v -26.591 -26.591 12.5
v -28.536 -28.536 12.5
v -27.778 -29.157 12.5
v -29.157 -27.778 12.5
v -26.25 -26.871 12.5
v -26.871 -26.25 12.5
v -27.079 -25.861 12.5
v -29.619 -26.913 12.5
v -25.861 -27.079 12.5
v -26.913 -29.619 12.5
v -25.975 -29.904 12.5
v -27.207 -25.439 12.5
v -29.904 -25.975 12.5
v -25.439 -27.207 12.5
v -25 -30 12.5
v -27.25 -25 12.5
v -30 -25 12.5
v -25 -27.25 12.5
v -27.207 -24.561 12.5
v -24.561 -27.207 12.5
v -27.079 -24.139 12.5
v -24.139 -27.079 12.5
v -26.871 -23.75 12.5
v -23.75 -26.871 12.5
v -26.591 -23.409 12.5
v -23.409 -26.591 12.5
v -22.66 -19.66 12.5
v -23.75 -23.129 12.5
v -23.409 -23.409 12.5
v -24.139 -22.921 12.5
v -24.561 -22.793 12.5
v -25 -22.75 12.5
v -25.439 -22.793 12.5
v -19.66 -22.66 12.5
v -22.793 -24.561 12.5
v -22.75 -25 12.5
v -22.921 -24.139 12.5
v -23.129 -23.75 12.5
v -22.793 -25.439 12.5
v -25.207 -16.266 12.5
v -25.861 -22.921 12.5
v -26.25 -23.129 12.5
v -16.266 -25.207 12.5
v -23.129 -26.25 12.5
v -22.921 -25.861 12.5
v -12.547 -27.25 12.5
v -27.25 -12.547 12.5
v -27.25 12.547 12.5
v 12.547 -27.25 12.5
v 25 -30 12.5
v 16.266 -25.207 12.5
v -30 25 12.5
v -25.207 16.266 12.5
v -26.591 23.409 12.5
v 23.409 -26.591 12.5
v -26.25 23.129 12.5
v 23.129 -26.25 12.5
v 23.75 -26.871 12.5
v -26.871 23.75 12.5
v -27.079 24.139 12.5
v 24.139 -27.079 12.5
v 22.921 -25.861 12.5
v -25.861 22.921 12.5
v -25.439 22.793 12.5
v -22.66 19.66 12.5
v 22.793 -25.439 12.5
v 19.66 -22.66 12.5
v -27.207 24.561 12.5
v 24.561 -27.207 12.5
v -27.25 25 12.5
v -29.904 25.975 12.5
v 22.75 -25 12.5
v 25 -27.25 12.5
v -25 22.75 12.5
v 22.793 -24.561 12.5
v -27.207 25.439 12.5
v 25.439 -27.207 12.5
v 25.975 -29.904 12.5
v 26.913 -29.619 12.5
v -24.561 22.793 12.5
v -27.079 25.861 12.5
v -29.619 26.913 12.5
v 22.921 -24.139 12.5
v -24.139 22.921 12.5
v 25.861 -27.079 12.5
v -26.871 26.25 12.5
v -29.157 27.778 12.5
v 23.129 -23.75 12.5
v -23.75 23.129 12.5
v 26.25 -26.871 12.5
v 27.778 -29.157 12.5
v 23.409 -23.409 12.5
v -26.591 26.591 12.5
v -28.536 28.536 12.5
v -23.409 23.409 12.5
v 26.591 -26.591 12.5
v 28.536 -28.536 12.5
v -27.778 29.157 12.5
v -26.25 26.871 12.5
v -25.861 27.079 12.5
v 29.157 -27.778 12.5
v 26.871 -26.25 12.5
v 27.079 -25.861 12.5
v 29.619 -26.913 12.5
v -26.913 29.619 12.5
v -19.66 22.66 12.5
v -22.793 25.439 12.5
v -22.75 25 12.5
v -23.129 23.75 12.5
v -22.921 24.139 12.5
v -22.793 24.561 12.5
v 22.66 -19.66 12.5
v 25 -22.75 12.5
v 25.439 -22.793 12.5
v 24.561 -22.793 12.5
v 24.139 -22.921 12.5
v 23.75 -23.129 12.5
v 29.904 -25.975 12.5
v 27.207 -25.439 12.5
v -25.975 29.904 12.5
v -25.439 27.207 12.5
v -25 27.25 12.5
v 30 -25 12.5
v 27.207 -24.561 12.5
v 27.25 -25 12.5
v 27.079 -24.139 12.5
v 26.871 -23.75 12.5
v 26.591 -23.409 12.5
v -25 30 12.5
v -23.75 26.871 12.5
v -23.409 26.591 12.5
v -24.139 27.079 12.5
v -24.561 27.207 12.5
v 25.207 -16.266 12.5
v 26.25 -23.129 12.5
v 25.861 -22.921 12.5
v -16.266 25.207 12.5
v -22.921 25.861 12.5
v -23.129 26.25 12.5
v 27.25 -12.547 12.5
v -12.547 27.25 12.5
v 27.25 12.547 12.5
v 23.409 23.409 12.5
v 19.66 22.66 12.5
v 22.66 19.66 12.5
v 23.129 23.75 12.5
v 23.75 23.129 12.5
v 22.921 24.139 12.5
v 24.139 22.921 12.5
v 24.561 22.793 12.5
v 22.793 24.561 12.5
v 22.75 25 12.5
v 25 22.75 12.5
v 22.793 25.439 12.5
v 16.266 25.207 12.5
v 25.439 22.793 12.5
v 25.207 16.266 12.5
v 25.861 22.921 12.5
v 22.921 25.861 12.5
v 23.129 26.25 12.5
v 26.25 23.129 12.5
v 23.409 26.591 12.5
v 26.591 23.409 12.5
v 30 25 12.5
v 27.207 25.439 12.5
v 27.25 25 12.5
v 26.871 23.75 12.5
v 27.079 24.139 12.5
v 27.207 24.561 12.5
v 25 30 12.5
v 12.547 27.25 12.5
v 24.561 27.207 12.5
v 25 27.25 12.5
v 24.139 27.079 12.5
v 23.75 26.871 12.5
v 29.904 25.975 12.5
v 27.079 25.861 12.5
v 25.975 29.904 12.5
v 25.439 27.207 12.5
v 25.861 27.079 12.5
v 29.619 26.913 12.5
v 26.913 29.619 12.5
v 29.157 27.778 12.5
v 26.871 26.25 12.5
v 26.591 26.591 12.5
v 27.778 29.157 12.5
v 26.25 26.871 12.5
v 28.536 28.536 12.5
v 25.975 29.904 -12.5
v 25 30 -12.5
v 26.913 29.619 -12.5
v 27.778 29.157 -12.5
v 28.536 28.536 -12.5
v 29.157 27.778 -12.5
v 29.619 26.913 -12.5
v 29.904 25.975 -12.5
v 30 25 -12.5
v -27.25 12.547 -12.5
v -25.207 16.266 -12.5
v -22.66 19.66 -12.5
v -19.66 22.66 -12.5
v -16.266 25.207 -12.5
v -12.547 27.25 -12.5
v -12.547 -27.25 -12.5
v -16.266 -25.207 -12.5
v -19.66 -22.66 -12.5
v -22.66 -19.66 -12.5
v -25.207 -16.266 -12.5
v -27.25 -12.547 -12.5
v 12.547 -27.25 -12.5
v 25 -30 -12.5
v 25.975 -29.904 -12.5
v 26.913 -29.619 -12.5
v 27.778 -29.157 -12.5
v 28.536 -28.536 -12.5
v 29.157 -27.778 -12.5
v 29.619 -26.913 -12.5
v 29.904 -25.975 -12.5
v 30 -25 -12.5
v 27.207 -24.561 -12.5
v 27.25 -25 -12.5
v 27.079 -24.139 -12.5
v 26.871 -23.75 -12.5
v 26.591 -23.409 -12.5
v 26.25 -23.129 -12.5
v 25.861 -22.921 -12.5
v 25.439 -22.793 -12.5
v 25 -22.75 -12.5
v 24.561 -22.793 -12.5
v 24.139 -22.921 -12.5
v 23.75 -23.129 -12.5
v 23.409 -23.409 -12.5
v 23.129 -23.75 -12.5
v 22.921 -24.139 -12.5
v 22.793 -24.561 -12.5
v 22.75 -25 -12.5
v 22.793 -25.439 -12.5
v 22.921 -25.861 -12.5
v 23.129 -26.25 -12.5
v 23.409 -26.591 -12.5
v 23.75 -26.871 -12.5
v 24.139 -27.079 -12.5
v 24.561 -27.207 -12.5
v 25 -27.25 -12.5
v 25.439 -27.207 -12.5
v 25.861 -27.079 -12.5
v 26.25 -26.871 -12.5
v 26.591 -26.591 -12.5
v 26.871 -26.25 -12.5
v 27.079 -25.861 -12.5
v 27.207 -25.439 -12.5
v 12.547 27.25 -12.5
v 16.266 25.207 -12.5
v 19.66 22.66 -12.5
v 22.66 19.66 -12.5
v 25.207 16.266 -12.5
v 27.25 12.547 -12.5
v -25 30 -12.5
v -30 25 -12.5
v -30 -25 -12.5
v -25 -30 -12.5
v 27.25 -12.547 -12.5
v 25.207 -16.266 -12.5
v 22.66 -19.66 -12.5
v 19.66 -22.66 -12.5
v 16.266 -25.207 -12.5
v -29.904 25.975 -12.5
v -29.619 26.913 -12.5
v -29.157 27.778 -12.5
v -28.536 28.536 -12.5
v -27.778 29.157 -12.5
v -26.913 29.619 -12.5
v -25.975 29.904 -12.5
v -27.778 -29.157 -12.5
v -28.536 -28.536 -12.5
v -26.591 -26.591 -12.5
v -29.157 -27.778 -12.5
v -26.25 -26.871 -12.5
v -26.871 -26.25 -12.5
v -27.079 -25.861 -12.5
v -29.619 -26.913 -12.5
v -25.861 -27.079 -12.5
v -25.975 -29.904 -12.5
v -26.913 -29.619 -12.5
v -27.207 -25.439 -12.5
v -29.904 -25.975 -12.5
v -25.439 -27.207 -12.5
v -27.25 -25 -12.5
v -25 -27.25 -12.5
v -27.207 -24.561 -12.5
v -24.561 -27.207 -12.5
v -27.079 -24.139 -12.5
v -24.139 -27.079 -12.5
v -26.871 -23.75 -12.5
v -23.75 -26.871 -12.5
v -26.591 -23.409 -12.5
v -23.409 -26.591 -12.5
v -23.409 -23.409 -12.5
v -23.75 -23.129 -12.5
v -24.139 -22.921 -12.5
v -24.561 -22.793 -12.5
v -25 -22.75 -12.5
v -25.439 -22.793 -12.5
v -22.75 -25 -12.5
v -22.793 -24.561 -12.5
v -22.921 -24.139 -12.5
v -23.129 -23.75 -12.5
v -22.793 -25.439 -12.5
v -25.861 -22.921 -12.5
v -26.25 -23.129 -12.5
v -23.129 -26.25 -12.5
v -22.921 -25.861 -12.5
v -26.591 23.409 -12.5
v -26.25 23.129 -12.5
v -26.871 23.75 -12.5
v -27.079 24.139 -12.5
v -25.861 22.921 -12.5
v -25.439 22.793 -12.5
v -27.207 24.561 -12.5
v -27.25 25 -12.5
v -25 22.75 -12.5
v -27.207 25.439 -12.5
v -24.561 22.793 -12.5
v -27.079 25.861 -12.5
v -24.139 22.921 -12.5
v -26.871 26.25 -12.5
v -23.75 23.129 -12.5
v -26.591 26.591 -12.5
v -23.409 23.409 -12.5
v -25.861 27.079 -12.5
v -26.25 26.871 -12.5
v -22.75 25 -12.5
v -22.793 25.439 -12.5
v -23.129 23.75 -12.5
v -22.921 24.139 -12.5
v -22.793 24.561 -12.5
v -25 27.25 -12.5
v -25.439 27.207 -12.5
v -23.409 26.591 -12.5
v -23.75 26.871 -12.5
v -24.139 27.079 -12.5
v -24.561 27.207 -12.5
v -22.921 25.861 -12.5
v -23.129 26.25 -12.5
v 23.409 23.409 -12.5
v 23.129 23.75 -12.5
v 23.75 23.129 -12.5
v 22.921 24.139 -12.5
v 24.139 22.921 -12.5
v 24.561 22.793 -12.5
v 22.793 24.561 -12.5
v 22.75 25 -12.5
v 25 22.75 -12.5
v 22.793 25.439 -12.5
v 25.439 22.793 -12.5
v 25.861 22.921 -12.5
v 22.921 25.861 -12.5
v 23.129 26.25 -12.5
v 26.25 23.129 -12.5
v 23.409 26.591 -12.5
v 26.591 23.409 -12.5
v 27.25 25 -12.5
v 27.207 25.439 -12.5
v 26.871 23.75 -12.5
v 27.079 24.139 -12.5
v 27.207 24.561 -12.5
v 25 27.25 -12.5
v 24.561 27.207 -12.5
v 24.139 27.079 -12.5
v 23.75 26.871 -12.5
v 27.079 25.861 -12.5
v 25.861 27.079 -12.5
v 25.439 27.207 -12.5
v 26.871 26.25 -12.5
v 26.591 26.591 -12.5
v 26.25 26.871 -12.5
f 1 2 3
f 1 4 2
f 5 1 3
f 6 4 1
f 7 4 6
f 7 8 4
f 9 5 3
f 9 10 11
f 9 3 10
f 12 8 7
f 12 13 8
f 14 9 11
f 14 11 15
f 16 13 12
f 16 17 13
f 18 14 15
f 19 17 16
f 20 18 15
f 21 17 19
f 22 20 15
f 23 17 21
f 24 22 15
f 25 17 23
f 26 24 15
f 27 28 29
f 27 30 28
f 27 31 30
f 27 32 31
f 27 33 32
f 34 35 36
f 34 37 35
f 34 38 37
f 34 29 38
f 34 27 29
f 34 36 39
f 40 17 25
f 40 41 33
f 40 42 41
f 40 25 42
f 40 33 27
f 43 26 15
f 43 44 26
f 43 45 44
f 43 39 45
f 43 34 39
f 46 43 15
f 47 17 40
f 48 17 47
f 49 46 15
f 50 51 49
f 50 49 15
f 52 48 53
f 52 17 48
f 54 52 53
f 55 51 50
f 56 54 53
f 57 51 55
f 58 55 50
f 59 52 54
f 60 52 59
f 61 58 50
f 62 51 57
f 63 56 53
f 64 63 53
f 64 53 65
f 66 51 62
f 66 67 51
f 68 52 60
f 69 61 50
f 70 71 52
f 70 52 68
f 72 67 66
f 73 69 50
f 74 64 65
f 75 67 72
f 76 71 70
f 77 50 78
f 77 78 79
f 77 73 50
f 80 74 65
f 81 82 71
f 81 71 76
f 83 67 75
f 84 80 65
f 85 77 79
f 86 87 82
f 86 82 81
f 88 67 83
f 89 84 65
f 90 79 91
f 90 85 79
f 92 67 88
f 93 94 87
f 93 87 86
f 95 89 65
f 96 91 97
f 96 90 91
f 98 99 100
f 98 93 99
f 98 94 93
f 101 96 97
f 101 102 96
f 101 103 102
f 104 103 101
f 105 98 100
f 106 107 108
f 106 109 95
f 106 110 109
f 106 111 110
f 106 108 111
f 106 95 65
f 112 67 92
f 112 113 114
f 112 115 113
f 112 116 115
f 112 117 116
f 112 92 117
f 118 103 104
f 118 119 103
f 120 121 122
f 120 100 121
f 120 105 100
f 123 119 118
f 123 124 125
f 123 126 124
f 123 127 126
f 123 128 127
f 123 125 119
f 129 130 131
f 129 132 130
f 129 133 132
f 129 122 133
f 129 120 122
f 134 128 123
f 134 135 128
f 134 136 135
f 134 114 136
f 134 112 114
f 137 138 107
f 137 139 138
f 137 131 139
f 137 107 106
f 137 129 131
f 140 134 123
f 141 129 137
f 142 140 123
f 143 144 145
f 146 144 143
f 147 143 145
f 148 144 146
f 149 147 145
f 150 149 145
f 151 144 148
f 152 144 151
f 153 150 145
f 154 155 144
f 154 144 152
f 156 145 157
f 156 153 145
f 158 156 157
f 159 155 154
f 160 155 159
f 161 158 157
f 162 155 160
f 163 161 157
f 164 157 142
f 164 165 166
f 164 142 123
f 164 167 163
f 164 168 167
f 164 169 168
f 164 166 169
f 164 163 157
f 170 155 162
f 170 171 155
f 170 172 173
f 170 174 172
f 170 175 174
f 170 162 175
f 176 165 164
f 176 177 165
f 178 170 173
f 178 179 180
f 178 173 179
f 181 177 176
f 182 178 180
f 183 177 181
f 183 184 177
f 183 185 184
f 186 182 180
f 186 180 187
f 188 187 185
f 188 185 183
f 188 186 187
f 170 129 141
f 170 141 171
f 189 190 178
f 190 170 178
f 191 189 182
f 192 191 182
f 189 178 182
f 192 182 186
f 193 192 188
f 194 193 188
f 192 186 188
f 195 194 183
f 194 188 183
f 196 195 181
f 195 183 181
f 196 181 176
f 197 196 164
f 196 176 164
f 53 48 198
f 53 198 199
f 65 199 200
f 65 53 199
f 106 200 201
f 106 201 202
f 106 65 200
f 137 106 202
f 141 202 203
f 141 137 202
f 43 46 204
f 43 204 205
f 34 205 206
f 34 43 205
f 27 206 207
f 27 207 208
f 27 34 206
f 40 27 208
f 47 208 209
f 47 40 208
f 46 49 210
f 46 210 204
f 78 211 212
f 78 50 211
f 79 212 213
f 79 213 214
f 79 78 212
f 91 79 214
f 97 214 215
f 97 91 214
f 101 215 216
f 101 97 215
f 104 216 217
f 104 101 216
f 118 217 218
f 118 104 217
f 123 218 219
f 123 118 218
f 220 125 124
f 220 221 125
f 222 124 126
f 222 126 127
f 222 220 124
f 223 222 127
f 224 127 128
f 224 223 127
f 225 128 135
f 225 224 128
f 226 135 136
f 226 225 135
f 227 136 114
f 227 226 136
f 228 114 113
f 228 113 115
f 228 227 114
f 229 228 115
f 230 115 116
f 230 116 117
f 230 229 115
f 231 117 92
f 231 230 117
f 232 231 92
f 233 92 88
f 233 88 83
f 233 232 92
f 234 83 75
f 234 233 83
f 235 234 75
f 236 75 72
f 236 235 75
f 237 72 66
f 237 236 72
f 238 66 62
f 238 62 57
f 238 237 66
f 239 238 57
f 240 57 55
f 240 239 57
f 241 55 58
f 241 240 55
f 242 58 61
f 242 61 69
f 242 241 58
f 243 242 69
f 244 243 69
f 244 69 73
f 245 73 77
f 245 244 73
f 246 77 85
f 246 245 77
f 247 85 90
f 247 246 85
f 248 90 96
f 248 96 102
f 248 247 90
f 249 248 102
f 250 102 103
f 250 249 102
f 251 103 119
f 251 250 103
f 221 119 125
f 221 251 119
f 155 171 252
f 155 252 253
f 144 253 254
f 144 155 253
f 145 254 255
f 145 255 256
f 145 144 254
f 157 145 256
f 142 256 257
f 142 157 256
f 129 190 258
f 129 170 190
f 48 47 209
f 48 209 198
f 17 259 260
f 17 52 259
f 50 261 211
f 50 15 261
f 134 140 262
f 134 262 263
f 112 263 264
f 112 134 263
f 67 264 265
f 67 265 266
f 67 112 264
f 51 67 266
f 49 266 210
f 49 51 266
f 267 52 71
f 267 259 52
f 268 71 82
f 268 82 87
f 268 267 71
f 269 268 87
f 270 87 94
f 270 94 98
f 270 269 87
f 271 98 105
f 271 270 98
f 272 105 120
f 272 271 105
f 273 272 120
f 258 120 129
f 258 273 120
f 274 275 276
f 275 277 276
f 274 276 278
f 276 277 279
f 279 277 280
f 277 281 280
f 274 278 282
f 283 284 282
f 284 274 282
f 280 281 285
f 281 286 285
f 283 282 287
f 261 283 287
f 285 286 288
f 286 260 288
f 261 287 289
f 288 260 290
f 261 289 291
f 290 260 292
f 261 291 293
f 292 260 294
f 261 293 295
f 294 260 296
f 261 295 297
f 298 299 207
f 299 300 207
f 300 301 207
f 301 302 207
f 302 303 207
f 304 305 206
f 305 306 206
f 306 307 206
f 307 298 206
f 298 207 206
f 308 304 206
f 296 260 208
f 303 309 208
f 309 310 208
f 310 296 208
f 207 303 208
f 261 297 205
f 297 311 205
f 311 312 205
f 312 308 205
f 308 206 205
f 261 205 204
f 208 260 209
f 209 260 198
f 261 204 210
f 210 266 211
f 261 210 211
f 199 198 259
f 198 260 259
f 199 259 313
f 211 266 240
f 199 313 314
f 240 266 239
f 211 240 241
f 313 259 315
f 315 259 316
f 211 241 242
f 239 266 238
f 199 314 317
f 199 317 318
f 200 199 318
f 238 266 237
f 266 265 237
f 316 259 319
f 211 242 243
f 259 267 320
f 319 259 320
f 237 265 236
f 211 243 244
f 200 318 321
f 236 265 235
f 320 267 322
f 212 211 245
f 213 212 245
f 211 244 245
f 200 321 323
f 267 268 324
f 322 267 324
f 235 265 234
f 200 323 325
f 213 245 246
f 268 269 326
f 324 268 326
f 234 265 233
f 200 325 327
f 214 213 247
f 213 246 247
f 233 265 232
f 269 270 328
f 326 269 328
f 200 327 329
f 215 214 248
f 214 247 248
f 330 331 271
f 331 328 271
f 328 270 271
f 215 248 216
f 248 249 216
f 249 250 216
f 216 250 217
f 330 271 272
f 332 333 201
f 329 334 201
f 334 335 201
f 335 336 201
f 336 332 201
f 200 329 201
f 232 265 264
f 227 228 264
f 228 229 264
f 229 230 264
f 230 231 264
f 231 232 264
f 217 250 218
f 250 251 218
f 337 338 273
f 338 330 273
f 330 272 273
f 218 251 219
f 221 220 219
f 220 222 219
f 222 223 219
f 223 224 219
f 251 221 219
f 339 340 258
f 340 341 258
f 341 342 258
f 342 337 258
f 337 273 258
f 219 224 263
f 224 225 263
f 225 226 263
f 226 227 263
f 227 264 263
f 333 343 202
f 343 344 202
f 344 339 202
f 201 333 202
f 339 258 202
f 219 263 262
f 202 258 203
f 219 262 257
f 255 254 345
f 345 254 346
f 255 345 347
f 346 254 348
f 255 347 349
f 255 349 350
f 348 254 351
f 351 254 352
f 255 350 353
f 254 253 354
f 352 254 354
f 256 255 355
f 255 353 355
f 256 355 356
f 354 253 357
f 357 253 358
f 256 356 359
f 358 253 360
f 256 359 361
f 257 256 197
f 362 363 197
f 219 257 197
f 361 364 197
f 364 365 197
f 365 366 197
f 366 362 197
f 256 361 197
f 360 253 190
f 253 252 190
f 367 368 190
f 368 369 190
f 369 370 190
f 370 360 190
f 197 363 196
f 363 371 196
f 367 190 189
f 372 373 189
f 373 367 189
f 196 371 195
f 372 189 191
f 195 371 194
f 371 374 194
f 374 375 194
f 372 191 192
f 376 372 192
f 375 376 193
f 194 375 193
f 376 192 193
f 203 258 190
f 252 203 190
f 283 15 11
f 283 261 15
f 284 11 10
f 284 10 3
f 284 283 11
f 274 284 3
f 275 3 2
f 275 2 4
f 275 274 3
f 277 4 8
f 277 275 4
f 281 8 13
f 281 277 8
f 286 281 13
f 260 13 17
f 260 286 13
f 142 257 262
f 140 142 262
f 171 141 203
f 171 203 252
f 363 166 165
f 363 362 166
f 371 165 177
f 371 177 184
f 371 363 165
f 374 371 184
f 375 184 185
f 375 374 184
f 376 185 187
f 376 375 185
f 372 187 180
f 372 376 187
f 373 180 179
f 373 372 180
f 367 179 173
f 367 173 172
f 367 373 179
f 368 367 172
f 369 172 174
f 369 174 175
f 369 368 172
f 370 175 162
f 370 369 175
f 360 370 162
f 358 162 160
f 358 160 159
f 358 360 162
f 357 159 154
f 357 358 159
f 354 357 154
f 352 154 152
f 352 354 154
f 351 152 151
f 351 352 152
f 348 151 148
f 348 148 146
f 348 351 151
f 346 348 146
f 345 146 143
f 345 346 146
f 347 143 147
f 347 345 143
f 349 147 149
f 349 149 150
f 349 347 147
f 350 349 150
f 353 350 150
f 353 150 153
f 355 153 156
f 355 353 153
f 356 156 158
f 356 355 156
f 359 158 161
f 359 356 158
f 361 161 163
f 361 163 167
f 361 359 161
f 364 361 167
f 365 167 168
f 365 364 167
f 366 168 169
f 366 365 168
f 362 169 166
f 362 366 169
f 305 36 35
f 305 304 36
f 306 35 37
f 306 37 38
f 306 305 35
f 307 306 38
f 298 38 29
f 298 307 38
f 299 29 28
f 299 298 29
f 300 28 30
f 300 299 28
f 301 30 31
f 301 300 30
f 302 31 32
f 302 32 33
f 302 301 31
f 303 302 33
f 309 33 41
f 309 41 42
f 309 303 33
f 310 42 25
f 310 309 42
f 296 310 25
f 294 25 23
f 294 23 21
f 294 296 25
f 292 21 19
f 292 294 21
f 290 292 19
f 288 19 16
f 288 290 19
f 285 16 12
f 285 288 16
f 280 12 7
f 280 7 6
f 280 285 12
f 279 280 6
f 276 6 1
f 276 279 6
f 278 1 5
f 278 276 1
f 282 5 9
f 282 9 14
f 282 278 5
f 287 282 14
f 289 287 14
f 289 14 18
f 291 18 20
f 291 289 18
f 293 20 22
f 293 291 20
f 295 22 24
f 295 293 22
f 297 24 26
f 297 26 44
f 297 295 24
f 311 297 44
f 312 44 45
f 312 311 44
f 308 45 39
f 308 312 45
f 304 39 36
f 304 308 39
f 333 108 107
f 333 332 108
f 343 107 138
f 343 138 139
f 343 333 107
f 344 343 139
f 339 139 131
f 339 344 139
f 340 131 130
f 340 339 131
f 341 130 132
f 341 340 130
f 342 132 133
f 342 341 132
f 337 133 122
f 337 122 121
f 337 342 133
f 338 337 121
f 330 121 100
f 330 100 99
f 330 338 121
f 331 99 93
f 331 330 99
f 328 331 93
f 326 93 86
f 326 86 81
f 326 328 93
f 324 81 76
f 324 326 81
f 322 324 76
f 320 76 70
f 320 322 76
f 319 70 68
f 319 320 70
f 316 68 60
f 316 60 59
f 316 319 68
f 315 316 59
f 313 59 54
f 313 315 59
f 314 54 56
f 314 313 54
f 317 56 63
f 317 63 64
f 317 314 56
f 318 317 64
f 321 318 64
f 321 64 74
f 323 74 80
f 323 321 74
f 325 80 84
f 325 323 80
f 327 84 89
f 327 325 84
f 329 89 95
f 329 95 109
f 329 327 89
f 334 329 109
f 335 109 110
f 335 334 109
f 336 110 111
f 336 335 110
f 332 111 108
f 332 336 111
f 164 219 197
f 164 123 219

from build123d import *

# Parameters (mm, degrees)
F0_R     = 2.25
F1_DEPTH = 12.5
F2_R     = 5


with BuildPart() as f1:
    # F0 (on Top) → F1 (new body, symmetric)
    with BuildSketch(Plane.XY):
        with BuildLine():
            Line((-12.5474100913, 30), (-30, 30))
            Line((-30, 30), (-30, 12.5474100913))
            Line((-30, 12.5474100913), (-27.25, 12.5474100913))
            ThreePointArc((-27.25, 12.5474100913), (-21.2132034356, 21.2132034356), (-12.5474100913, 27.25))
            Line((-12.5474100913, 27.25), (-12.5474100913, 30))
        make_face()
        with Locations((-25, 25)):
            Circle(F0_R, mode=Mode.SUBTRACT)
        with BuildLine():
            Line((-2.31e-08, 30), (-12.5474100913, 30))
            Line((-12.5474100913, 30), (-12.5474100913, 27.25))
            ThreePointArc((-12.5474100913, 27.25), (-6.4226163006, 29.3044365217), (-2.31e-08, 30))
        make_face()
        with BuildLine():
            Line((-27.25, 12.5474100913), (-30, 12.5474100913))
            Line((-30, 12.5474100913), (-30, 3.74e-08))
            ThreePointArc((-30, 3.74e-08), (-29.3044365202, 6.4226163076), (-27.25, 12.5474100913))
        make_face()
        with BuildLine():
            Line((12.5474100913, 30), (-2.31e-08, 30))
            ThreePointArc((-2.31e-08, 30), (6.422616278, 29.3044365267), (12.5474100913, 27.25))
            Line((12.5474100913, 27.25), (12.5474100913, 30))
        make_face()
        with BuildLine():
            ThreePointArc((12.5474100913, 27.25), (6.422616278, 29.3044365267), (-2.31e-08, 30))
            ThreePointArc((-2.31e-08, 30), (-6.4226163006, 29.3044365217), (-12.5474100913, 27.25))
            Line((-12.5474100913, 27.25), (12.5474100913, 27.25))
        make_face()
        with BuildLine():
            ThreePointArc((-27.25, -12.5474100913), (-29.3044365282, -6.4226162711), (-30, 3.74e-08))
            Line((-30, 3.74e-08), (-30, -12.5474100913))
            Line((-30, -12.5474100913), (-27.25, -12.5474100913))
        make_face()
        with BuildLine():
            ThreePointArc((-27.25, 12.5474100913), (-29.3044365202, 6.4226163076), (-30, 3.74e-08))
            ThreePointArc((-30, 3.74e-08), (-29.3044365282, -6.4226162711), (-27.25, -12.5474100913))
            Line((-27.25, -12.5474100913), (-27.25, 12.5474100913))
        make_face()
        with BuildLine():
            Line((30, 30), (12.5474100913, 30))
            Line((12.5474100913, 30), (12.5474100913, 27.25))
            ThreePointArc((12.5474100913, 27.25), (21.2132034356, 21.2132034356), (27.25, 12.5474100913))
            Line((27.25, 12.5474100913), (30, 12.5474100913))
            Line((30, 12.5474100913), (30, 30))
        make_face()
        with Locations((25, 25)):
            Circle(F0_R, mode=Mode.SUBTRACT)
        with BuildLine():
            Line((-27.25, -12.5474100913), (-30, -12.5474100913))
            Line((-30, -12.5474100913), (-30, -30))
            Line((-30, -30), (-12.5474100913, -30))
            Line((-12.5474100913, -30), (-12.5474100913, -27.25))
            ThreePointArc((-12.5474100913, -27.25), (-21.2132034356, -21.2132034356), (-27.25, -12.5474100913))
        make_face()
        with Locations((-25, -25)):
            Circle(F0_R, mode=Mode.SUBTRACT)
        with BuildLine():
            Line((30, 12.5474100913), (27.25, 12.5474100913))
            ThreePointArc((27.25, 12.5474100913), (29.3044365242, 6.4226162893), (30, 0))
            Line((30, 0), (30, 12.5474100913))
        make_face()
        with BuildLine():
            ThreePointArc((30, 0), (29.3044365242, 6.4226162893), (27.25, 12.5474100913))
            Line((27.25, 12.5474100913), (27.25, -12.5474100913))
            ThreePointArc((27.25, -12.5474100913), (29.3044365242, -6.4226162893), (30, 0))
        make_face()
        with BuildLine():
            Line((12.5474100913, -27.25), (-12.5474100913, -27.25))
            ThreePointArc((-12.5474100913, -27.25), (-6.4226162893, -29.3044365242), (0, -30))
            ThreePointArc((0, -30), (6.4226162893, -29.3044365242), (12.5474100913, -27.25))
        make_face()
        with BuildLine():
            ThreePointArc((0, -30), (-6.4226162893, -29.3044365242), (-12.5474100913, -27.25))
            Line((-12.5474100913, -27.25), (-12.5474100913, -30))
            Line((-12.5474100913, -30), (0, -30))
        make_face()
        with BuildLine():
            Line((30, -12.5474100913), (30, 0))
            ThreePointArc((30, 0), (29.3044365242, -6.4226162893), (27.25, -12.5474100913))
            Line((27.25, -12.5474100913), (30, -12.5474100913))
        make_face()
        with BuildLine():
            Line((30, -12.5474100913), (27.25, -12.5474100913))
            ThreePointArc((27.25, -12.5474100913), (21.2132034356, -21.2132034356), (12.5474100913, -27.25))
            Line((12.5474100913, -27.25), (12.5474100913, -30))
            Line((12.5474100913, -30), (30, -30))
            Line((30, -30), (30, -12.5474100913))
        make_face()
        with Locations((25, -25)):
            Circle(F0_R, mode=Mode.SUBTRACT)
        with BuildLine():
            ThreePointArc((12.5474100913, -27.25), (6.4226162893, -29.3044365242), (0, -30))
            Line((0, -30), (12.5474100913, -30))
            Line((12.5474100913, -30), (12.5474100913, -27.25))
        make_face()
    extrude(amount=F1_DEPTH, both=True)

    # F2
    f2_edges = [f1.edges().sort_by_distance(p)[0] for p in [
        (-30, 30, 0),
        (30, -30, 0),
        (30, 30, 0),
        (-30, -30, 0),
    ]]
    fillet(f2_edges, radius=F2_R)


solid = f1.part
